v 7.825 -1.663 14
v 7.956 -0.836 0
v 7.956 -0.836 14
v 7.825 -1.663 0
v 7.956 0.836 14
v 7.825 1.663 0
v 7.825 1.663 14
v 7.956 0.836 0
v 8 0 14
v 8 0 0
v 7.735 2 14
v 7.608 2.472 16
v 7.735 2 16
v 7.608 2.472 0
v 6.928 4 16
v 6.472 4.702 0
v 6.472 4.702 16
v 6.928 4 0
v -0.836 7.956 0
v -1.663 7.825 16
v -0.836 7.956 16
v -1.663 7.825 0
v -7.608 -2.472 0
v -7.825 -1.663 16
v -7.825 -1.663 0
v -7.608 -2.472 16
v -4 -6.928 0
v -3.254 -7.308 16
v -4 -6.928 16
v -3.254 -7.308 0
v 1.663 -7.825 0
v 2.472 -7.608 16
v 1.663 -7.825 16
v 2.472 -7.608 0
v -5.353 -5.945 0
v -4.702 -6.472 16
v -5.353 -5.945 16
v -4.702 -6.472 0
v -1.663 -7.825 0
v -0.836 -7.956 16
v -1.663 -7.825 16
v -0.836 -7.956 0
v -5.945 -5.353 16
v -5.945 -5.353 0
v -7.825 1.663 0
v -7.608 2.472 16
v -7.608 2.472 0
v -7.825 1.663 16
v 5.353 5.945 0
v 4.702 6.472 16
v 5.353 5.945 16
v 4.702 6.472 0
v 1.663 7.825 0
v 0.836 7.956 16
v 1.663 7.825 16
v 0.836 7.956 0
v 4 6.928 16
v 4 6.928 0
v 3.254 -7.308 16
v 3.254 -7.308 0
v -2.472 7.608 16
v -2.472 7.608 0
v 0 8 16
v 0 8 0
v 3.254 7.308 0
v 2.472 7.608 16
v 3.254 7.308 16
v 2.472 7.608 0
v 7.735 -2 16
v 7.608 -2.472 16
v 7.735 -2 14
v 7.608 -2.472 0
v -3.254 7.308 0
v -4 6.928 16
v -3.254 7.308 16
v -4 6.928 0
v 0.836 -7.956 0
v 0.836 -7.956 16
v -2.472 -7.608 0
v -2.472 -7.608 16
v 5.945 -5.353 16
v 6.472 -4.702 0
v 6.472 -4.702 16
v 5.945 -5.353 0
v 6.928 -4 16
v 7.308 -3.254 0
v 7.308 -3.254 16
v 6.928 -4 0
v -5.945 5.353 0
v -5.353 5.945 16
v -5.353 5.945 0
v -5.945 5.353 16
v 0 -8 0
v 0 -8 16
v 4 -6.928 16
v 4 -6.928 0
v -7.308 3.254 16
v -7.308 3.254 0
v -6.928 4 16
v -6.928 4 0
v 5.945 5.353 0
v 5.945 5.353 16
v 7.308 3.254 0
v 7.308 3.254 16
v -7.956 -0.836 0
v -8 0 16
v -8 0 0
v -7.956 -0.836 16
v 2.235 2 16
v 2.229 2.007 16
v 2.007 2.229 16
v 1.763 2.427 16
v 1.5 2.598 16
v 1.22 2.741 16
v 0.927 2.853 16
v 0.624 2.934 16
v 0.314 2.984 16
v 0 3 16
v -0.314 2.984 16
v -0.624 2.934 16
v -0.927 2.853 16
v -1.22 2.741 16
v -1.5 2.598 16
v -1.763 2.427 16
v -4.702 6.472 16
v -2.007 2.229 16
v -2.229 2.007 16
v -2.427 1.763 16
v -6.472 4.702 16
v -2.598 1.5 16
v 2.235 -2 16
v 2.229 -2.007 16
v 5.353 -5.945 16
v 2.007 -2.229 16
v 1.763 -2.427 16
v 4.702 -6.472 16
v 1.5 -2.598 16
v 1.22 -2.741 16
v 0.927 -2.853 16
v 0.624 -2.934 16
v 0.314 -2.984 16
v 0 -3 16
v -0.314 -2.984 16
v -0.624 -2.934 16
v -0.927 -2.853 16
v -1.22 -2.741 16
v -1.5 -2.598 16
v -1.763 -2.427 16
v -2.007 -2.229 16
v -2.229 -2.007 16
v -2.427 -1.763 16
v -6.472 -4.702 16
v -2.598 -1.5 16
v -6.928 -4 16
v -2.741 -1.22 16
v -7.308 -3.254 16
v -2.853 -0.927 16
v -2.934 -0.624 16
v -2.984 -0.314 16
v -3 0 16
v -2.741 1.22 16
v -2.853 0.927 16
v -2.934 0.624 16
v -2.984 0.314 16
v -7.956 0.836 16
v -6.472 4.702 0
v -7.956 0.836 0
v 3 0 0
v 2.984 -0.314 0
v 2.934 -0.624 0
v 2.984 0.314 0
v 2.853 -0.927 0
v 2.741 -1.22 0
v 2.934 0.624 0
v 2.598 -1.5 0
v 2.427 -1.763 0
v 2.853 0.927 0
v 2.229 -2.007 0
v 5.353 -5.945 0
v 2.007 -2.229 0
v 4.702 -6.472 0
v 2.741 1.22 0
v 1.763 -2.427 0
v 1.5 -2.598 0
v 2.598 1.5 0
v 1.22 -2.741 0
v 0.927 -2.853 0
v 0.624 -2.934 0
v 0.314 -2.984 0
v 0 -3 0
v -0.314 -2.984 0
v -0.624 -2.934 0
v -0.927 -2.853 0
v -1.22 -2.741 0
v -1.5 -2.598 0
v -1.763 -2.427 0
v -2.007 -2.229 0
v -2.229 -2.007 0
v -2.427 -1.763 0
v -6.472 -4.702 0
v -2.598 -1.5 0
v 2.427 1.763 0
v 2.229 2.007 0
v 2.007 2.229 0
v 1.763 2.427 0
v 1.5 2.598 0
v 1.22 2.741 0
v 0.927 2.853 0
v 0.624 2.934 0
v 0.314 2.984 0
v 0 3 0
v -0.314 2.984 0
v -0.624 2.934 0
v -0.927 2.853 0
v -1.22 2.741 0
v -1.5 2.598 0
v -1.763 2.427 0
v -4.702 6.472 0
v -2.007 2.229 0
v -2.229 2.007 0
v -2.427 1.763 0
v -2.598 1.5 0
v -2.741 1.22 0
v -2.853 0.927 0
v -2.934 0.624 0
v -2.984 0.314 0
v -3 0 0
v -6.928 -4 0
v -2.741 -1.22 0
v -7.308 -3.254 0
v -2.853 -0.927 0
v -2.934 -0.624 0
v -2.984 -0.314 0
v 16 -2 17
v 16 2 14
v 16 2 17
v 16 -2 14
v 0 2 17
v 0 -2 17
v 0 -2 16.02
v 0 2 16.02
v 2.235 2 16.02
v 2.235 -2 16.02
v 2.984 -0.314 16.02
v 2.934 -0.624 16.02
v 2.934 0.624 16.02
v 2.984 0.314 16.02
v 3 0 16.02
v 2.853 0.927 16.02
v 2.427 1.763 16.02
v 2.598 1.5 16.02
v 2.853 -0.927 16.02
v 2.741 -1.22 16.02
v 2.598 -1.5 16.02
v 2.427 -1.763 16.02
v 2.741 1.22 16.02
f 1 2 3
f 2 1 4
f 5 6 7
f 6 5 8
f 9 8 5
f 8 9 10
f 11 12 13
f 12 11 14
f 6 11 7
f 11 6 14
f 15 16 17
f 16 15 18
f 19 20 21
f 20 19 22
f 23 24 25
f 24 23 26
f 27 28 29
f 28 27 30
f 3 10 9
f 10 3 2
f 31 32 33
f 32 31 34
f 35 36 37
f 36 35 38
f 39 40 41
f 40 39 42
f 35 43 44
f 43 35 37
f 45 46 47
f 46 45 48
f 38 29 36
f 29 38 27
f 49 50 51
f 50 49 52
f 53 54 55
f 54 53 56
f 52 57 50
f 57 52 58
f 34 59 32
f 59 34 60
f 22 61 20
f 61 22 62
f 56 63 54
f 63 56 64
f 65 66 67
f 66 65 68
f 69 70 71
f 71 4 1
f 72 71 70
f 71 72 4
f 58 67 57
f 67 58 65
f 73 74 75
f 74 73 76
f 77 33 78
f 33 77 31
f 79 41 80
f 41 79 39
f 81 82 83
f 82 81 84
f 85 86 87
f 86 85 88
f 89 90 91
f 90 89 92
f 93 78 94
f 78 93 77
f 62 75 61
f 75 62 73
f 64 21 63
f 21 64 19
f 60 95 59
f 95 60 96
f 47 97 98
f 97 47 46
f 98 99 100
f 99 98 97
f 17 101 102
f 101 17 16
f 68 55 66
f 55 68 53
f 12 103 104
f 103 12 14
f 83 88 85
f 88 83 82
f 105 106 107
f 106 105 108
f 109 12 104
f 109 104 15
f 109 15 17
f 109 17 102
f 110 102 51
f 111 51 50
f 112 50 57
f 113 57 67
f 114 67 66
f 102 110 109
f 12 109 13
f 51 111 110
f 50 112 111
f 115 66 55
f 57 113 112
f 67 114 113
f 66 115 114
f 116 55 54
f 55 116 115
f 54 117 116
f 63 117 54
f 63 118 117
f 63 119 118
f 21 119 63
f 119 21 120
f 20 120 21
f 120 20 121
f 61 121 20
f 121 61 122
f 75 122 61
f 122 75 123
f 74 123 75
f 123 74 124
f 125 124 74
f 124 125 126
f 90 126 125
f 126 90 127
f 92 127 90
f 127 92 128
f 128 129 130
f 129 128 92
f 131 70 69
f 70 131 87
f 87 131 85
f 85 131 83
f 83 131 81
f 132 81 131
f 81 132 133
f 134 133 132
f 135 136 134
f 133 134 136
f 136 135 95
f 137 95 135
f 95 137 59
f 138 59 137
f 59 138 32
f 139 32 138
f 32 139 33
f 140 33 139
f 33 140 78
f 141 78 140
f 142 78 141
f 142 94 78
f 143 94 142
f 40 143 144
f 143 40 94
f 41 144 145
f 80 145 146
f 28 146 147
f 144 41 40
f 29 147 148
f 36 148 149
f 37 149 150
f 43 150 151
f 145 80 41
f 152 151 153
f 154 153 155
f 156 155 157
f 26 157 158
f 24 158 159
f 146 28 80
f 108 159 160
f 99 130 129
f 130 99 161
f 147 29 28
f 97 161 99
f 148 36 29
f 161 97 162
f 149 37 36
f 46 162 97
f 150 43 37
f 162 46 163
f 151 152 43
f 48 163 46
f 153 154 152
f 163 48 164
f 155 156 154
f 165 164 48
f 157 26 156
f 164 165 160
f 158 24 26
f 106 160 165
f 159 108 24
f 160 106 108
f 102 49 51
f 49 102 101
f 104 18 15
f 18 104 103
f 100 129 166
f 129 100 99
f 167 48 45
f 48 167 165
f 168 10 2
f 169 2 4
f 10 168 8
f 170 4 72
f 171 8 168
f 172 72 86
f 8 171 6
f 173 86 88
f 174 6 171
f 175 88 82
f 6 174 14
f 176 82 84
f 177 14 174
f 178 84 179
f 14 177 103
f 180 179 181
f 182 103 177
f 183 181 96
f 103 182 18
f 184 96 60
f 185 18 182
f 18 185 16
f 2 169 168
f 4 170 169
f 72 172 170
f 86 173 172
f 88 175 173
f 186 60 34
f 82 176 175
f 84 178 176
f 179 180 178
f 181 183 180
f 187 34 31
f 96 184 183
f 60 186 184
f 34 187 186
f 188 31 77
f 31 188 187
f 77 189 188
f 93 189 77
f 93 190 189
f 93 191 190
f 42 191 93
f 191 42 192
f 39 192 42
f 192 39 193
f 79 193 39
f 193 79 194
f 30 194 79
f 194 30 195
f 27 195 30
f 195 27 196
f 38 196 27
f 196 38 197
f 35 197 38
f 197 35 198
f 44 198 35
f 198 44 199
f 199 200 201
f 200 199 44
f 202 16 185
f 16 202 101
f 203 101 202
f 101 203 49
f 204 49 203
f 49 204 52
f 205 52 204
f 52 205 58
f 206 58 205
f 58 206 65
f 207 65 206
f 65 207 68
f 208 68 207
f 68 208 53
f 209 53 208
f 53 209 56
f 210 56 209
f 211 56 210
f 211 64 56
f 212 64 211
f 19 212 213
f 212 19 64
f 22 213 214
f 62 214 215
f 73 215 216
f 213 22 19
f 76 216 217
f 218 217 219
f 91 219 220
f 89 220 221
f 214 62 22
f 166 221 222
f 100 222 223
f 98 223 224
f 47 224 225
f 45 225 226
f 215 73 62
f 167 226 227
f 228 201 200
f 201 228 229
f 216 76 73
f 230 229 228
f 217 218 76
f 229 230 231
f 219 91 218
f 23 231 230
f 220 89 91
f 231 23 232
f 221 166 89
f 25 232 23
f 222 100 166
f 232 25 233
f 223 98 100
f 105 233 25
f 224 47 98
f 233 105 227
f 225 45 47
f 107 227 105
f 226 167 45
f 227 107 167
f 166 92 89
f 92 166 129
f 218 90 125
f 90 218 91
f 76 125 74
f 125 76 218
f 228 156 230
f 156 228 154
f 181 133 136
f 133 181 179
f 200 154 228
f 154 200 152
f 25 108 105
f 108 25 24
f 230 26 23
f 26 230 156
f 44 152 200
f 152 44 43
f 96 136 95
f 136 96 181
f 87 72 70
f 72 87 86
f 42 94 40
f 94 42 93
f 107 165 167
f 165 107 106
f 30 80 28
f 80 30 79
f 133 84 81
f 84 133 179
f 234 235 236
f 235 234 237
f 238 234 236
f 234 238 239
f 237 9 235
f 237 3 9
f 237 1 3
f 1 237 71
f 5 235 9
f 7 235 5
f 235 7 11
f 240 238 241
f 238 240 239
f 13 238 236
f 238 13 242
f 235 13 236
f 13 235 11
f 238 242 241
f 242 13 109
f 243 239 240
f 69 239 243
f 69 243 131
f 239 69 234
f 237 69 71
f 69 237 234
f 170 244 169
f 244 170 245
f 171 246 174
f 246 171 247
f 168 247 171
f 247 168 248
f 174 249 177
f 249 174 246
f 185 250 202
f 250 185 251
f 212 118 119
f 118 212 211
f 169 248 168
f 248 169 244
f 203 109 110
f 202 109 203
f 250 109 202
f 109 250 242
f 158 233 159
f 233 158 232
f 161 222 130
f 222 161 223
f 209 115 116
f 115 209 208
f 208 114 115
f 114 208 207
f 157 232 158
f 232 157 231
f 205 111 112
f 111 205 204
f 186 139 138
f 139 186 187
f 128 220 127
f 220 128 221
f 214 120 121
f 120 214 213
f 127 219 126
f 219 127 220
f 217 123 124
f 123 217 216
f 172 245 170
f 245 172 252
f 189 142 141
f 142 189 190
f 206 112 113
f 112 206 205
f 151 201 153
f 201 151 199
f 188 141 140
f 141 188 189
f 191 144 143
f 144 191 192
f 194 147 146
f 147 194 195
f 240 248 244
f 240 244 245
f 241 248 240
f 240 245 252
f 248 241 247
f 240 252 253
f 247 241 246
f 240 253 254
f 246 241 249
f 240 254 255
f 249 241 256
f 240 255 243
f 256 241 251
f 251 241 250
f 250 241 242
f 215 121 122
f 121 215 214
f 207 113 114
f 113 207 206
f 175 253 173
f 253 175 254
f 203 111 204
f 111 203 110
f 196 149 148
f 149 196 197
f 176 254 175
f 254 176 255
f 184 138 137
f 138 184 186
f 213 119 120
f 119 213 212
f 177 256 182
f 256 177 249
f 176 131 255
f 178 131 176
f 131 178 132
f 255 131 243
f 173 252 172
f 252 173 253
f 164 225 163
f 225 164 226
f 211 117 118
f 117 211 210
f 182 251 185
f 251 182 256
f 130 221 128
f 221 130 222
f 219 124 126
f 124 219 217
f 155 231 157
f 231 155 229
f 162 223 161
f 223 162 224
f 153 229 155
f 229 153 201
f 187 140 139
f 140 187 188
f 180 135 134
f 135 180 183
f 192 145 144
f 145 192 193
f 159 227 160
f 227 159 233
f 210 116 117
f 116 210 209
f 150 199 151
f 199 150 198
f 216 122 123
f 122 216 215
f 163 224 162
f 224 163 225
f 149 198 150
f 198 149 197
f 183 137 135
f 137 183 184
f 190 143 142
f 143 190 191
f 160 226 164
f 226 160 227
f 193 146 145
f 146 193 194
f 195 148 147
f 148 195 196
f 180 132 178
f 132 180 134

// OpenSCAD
// Quarter-turn cam lock.
$fn = 60;
eps = 0.02;
body_d = 16;
body_l = 16;
arm_l = 16;
difference() { union() { cylinder(d=body_d,h=body_l); translate([0,-2,body_l-2]) cube([arm_l,4,3]); } translate([0,0,-eps]) cylinder(d=6,h=body_l+2*eps); }
